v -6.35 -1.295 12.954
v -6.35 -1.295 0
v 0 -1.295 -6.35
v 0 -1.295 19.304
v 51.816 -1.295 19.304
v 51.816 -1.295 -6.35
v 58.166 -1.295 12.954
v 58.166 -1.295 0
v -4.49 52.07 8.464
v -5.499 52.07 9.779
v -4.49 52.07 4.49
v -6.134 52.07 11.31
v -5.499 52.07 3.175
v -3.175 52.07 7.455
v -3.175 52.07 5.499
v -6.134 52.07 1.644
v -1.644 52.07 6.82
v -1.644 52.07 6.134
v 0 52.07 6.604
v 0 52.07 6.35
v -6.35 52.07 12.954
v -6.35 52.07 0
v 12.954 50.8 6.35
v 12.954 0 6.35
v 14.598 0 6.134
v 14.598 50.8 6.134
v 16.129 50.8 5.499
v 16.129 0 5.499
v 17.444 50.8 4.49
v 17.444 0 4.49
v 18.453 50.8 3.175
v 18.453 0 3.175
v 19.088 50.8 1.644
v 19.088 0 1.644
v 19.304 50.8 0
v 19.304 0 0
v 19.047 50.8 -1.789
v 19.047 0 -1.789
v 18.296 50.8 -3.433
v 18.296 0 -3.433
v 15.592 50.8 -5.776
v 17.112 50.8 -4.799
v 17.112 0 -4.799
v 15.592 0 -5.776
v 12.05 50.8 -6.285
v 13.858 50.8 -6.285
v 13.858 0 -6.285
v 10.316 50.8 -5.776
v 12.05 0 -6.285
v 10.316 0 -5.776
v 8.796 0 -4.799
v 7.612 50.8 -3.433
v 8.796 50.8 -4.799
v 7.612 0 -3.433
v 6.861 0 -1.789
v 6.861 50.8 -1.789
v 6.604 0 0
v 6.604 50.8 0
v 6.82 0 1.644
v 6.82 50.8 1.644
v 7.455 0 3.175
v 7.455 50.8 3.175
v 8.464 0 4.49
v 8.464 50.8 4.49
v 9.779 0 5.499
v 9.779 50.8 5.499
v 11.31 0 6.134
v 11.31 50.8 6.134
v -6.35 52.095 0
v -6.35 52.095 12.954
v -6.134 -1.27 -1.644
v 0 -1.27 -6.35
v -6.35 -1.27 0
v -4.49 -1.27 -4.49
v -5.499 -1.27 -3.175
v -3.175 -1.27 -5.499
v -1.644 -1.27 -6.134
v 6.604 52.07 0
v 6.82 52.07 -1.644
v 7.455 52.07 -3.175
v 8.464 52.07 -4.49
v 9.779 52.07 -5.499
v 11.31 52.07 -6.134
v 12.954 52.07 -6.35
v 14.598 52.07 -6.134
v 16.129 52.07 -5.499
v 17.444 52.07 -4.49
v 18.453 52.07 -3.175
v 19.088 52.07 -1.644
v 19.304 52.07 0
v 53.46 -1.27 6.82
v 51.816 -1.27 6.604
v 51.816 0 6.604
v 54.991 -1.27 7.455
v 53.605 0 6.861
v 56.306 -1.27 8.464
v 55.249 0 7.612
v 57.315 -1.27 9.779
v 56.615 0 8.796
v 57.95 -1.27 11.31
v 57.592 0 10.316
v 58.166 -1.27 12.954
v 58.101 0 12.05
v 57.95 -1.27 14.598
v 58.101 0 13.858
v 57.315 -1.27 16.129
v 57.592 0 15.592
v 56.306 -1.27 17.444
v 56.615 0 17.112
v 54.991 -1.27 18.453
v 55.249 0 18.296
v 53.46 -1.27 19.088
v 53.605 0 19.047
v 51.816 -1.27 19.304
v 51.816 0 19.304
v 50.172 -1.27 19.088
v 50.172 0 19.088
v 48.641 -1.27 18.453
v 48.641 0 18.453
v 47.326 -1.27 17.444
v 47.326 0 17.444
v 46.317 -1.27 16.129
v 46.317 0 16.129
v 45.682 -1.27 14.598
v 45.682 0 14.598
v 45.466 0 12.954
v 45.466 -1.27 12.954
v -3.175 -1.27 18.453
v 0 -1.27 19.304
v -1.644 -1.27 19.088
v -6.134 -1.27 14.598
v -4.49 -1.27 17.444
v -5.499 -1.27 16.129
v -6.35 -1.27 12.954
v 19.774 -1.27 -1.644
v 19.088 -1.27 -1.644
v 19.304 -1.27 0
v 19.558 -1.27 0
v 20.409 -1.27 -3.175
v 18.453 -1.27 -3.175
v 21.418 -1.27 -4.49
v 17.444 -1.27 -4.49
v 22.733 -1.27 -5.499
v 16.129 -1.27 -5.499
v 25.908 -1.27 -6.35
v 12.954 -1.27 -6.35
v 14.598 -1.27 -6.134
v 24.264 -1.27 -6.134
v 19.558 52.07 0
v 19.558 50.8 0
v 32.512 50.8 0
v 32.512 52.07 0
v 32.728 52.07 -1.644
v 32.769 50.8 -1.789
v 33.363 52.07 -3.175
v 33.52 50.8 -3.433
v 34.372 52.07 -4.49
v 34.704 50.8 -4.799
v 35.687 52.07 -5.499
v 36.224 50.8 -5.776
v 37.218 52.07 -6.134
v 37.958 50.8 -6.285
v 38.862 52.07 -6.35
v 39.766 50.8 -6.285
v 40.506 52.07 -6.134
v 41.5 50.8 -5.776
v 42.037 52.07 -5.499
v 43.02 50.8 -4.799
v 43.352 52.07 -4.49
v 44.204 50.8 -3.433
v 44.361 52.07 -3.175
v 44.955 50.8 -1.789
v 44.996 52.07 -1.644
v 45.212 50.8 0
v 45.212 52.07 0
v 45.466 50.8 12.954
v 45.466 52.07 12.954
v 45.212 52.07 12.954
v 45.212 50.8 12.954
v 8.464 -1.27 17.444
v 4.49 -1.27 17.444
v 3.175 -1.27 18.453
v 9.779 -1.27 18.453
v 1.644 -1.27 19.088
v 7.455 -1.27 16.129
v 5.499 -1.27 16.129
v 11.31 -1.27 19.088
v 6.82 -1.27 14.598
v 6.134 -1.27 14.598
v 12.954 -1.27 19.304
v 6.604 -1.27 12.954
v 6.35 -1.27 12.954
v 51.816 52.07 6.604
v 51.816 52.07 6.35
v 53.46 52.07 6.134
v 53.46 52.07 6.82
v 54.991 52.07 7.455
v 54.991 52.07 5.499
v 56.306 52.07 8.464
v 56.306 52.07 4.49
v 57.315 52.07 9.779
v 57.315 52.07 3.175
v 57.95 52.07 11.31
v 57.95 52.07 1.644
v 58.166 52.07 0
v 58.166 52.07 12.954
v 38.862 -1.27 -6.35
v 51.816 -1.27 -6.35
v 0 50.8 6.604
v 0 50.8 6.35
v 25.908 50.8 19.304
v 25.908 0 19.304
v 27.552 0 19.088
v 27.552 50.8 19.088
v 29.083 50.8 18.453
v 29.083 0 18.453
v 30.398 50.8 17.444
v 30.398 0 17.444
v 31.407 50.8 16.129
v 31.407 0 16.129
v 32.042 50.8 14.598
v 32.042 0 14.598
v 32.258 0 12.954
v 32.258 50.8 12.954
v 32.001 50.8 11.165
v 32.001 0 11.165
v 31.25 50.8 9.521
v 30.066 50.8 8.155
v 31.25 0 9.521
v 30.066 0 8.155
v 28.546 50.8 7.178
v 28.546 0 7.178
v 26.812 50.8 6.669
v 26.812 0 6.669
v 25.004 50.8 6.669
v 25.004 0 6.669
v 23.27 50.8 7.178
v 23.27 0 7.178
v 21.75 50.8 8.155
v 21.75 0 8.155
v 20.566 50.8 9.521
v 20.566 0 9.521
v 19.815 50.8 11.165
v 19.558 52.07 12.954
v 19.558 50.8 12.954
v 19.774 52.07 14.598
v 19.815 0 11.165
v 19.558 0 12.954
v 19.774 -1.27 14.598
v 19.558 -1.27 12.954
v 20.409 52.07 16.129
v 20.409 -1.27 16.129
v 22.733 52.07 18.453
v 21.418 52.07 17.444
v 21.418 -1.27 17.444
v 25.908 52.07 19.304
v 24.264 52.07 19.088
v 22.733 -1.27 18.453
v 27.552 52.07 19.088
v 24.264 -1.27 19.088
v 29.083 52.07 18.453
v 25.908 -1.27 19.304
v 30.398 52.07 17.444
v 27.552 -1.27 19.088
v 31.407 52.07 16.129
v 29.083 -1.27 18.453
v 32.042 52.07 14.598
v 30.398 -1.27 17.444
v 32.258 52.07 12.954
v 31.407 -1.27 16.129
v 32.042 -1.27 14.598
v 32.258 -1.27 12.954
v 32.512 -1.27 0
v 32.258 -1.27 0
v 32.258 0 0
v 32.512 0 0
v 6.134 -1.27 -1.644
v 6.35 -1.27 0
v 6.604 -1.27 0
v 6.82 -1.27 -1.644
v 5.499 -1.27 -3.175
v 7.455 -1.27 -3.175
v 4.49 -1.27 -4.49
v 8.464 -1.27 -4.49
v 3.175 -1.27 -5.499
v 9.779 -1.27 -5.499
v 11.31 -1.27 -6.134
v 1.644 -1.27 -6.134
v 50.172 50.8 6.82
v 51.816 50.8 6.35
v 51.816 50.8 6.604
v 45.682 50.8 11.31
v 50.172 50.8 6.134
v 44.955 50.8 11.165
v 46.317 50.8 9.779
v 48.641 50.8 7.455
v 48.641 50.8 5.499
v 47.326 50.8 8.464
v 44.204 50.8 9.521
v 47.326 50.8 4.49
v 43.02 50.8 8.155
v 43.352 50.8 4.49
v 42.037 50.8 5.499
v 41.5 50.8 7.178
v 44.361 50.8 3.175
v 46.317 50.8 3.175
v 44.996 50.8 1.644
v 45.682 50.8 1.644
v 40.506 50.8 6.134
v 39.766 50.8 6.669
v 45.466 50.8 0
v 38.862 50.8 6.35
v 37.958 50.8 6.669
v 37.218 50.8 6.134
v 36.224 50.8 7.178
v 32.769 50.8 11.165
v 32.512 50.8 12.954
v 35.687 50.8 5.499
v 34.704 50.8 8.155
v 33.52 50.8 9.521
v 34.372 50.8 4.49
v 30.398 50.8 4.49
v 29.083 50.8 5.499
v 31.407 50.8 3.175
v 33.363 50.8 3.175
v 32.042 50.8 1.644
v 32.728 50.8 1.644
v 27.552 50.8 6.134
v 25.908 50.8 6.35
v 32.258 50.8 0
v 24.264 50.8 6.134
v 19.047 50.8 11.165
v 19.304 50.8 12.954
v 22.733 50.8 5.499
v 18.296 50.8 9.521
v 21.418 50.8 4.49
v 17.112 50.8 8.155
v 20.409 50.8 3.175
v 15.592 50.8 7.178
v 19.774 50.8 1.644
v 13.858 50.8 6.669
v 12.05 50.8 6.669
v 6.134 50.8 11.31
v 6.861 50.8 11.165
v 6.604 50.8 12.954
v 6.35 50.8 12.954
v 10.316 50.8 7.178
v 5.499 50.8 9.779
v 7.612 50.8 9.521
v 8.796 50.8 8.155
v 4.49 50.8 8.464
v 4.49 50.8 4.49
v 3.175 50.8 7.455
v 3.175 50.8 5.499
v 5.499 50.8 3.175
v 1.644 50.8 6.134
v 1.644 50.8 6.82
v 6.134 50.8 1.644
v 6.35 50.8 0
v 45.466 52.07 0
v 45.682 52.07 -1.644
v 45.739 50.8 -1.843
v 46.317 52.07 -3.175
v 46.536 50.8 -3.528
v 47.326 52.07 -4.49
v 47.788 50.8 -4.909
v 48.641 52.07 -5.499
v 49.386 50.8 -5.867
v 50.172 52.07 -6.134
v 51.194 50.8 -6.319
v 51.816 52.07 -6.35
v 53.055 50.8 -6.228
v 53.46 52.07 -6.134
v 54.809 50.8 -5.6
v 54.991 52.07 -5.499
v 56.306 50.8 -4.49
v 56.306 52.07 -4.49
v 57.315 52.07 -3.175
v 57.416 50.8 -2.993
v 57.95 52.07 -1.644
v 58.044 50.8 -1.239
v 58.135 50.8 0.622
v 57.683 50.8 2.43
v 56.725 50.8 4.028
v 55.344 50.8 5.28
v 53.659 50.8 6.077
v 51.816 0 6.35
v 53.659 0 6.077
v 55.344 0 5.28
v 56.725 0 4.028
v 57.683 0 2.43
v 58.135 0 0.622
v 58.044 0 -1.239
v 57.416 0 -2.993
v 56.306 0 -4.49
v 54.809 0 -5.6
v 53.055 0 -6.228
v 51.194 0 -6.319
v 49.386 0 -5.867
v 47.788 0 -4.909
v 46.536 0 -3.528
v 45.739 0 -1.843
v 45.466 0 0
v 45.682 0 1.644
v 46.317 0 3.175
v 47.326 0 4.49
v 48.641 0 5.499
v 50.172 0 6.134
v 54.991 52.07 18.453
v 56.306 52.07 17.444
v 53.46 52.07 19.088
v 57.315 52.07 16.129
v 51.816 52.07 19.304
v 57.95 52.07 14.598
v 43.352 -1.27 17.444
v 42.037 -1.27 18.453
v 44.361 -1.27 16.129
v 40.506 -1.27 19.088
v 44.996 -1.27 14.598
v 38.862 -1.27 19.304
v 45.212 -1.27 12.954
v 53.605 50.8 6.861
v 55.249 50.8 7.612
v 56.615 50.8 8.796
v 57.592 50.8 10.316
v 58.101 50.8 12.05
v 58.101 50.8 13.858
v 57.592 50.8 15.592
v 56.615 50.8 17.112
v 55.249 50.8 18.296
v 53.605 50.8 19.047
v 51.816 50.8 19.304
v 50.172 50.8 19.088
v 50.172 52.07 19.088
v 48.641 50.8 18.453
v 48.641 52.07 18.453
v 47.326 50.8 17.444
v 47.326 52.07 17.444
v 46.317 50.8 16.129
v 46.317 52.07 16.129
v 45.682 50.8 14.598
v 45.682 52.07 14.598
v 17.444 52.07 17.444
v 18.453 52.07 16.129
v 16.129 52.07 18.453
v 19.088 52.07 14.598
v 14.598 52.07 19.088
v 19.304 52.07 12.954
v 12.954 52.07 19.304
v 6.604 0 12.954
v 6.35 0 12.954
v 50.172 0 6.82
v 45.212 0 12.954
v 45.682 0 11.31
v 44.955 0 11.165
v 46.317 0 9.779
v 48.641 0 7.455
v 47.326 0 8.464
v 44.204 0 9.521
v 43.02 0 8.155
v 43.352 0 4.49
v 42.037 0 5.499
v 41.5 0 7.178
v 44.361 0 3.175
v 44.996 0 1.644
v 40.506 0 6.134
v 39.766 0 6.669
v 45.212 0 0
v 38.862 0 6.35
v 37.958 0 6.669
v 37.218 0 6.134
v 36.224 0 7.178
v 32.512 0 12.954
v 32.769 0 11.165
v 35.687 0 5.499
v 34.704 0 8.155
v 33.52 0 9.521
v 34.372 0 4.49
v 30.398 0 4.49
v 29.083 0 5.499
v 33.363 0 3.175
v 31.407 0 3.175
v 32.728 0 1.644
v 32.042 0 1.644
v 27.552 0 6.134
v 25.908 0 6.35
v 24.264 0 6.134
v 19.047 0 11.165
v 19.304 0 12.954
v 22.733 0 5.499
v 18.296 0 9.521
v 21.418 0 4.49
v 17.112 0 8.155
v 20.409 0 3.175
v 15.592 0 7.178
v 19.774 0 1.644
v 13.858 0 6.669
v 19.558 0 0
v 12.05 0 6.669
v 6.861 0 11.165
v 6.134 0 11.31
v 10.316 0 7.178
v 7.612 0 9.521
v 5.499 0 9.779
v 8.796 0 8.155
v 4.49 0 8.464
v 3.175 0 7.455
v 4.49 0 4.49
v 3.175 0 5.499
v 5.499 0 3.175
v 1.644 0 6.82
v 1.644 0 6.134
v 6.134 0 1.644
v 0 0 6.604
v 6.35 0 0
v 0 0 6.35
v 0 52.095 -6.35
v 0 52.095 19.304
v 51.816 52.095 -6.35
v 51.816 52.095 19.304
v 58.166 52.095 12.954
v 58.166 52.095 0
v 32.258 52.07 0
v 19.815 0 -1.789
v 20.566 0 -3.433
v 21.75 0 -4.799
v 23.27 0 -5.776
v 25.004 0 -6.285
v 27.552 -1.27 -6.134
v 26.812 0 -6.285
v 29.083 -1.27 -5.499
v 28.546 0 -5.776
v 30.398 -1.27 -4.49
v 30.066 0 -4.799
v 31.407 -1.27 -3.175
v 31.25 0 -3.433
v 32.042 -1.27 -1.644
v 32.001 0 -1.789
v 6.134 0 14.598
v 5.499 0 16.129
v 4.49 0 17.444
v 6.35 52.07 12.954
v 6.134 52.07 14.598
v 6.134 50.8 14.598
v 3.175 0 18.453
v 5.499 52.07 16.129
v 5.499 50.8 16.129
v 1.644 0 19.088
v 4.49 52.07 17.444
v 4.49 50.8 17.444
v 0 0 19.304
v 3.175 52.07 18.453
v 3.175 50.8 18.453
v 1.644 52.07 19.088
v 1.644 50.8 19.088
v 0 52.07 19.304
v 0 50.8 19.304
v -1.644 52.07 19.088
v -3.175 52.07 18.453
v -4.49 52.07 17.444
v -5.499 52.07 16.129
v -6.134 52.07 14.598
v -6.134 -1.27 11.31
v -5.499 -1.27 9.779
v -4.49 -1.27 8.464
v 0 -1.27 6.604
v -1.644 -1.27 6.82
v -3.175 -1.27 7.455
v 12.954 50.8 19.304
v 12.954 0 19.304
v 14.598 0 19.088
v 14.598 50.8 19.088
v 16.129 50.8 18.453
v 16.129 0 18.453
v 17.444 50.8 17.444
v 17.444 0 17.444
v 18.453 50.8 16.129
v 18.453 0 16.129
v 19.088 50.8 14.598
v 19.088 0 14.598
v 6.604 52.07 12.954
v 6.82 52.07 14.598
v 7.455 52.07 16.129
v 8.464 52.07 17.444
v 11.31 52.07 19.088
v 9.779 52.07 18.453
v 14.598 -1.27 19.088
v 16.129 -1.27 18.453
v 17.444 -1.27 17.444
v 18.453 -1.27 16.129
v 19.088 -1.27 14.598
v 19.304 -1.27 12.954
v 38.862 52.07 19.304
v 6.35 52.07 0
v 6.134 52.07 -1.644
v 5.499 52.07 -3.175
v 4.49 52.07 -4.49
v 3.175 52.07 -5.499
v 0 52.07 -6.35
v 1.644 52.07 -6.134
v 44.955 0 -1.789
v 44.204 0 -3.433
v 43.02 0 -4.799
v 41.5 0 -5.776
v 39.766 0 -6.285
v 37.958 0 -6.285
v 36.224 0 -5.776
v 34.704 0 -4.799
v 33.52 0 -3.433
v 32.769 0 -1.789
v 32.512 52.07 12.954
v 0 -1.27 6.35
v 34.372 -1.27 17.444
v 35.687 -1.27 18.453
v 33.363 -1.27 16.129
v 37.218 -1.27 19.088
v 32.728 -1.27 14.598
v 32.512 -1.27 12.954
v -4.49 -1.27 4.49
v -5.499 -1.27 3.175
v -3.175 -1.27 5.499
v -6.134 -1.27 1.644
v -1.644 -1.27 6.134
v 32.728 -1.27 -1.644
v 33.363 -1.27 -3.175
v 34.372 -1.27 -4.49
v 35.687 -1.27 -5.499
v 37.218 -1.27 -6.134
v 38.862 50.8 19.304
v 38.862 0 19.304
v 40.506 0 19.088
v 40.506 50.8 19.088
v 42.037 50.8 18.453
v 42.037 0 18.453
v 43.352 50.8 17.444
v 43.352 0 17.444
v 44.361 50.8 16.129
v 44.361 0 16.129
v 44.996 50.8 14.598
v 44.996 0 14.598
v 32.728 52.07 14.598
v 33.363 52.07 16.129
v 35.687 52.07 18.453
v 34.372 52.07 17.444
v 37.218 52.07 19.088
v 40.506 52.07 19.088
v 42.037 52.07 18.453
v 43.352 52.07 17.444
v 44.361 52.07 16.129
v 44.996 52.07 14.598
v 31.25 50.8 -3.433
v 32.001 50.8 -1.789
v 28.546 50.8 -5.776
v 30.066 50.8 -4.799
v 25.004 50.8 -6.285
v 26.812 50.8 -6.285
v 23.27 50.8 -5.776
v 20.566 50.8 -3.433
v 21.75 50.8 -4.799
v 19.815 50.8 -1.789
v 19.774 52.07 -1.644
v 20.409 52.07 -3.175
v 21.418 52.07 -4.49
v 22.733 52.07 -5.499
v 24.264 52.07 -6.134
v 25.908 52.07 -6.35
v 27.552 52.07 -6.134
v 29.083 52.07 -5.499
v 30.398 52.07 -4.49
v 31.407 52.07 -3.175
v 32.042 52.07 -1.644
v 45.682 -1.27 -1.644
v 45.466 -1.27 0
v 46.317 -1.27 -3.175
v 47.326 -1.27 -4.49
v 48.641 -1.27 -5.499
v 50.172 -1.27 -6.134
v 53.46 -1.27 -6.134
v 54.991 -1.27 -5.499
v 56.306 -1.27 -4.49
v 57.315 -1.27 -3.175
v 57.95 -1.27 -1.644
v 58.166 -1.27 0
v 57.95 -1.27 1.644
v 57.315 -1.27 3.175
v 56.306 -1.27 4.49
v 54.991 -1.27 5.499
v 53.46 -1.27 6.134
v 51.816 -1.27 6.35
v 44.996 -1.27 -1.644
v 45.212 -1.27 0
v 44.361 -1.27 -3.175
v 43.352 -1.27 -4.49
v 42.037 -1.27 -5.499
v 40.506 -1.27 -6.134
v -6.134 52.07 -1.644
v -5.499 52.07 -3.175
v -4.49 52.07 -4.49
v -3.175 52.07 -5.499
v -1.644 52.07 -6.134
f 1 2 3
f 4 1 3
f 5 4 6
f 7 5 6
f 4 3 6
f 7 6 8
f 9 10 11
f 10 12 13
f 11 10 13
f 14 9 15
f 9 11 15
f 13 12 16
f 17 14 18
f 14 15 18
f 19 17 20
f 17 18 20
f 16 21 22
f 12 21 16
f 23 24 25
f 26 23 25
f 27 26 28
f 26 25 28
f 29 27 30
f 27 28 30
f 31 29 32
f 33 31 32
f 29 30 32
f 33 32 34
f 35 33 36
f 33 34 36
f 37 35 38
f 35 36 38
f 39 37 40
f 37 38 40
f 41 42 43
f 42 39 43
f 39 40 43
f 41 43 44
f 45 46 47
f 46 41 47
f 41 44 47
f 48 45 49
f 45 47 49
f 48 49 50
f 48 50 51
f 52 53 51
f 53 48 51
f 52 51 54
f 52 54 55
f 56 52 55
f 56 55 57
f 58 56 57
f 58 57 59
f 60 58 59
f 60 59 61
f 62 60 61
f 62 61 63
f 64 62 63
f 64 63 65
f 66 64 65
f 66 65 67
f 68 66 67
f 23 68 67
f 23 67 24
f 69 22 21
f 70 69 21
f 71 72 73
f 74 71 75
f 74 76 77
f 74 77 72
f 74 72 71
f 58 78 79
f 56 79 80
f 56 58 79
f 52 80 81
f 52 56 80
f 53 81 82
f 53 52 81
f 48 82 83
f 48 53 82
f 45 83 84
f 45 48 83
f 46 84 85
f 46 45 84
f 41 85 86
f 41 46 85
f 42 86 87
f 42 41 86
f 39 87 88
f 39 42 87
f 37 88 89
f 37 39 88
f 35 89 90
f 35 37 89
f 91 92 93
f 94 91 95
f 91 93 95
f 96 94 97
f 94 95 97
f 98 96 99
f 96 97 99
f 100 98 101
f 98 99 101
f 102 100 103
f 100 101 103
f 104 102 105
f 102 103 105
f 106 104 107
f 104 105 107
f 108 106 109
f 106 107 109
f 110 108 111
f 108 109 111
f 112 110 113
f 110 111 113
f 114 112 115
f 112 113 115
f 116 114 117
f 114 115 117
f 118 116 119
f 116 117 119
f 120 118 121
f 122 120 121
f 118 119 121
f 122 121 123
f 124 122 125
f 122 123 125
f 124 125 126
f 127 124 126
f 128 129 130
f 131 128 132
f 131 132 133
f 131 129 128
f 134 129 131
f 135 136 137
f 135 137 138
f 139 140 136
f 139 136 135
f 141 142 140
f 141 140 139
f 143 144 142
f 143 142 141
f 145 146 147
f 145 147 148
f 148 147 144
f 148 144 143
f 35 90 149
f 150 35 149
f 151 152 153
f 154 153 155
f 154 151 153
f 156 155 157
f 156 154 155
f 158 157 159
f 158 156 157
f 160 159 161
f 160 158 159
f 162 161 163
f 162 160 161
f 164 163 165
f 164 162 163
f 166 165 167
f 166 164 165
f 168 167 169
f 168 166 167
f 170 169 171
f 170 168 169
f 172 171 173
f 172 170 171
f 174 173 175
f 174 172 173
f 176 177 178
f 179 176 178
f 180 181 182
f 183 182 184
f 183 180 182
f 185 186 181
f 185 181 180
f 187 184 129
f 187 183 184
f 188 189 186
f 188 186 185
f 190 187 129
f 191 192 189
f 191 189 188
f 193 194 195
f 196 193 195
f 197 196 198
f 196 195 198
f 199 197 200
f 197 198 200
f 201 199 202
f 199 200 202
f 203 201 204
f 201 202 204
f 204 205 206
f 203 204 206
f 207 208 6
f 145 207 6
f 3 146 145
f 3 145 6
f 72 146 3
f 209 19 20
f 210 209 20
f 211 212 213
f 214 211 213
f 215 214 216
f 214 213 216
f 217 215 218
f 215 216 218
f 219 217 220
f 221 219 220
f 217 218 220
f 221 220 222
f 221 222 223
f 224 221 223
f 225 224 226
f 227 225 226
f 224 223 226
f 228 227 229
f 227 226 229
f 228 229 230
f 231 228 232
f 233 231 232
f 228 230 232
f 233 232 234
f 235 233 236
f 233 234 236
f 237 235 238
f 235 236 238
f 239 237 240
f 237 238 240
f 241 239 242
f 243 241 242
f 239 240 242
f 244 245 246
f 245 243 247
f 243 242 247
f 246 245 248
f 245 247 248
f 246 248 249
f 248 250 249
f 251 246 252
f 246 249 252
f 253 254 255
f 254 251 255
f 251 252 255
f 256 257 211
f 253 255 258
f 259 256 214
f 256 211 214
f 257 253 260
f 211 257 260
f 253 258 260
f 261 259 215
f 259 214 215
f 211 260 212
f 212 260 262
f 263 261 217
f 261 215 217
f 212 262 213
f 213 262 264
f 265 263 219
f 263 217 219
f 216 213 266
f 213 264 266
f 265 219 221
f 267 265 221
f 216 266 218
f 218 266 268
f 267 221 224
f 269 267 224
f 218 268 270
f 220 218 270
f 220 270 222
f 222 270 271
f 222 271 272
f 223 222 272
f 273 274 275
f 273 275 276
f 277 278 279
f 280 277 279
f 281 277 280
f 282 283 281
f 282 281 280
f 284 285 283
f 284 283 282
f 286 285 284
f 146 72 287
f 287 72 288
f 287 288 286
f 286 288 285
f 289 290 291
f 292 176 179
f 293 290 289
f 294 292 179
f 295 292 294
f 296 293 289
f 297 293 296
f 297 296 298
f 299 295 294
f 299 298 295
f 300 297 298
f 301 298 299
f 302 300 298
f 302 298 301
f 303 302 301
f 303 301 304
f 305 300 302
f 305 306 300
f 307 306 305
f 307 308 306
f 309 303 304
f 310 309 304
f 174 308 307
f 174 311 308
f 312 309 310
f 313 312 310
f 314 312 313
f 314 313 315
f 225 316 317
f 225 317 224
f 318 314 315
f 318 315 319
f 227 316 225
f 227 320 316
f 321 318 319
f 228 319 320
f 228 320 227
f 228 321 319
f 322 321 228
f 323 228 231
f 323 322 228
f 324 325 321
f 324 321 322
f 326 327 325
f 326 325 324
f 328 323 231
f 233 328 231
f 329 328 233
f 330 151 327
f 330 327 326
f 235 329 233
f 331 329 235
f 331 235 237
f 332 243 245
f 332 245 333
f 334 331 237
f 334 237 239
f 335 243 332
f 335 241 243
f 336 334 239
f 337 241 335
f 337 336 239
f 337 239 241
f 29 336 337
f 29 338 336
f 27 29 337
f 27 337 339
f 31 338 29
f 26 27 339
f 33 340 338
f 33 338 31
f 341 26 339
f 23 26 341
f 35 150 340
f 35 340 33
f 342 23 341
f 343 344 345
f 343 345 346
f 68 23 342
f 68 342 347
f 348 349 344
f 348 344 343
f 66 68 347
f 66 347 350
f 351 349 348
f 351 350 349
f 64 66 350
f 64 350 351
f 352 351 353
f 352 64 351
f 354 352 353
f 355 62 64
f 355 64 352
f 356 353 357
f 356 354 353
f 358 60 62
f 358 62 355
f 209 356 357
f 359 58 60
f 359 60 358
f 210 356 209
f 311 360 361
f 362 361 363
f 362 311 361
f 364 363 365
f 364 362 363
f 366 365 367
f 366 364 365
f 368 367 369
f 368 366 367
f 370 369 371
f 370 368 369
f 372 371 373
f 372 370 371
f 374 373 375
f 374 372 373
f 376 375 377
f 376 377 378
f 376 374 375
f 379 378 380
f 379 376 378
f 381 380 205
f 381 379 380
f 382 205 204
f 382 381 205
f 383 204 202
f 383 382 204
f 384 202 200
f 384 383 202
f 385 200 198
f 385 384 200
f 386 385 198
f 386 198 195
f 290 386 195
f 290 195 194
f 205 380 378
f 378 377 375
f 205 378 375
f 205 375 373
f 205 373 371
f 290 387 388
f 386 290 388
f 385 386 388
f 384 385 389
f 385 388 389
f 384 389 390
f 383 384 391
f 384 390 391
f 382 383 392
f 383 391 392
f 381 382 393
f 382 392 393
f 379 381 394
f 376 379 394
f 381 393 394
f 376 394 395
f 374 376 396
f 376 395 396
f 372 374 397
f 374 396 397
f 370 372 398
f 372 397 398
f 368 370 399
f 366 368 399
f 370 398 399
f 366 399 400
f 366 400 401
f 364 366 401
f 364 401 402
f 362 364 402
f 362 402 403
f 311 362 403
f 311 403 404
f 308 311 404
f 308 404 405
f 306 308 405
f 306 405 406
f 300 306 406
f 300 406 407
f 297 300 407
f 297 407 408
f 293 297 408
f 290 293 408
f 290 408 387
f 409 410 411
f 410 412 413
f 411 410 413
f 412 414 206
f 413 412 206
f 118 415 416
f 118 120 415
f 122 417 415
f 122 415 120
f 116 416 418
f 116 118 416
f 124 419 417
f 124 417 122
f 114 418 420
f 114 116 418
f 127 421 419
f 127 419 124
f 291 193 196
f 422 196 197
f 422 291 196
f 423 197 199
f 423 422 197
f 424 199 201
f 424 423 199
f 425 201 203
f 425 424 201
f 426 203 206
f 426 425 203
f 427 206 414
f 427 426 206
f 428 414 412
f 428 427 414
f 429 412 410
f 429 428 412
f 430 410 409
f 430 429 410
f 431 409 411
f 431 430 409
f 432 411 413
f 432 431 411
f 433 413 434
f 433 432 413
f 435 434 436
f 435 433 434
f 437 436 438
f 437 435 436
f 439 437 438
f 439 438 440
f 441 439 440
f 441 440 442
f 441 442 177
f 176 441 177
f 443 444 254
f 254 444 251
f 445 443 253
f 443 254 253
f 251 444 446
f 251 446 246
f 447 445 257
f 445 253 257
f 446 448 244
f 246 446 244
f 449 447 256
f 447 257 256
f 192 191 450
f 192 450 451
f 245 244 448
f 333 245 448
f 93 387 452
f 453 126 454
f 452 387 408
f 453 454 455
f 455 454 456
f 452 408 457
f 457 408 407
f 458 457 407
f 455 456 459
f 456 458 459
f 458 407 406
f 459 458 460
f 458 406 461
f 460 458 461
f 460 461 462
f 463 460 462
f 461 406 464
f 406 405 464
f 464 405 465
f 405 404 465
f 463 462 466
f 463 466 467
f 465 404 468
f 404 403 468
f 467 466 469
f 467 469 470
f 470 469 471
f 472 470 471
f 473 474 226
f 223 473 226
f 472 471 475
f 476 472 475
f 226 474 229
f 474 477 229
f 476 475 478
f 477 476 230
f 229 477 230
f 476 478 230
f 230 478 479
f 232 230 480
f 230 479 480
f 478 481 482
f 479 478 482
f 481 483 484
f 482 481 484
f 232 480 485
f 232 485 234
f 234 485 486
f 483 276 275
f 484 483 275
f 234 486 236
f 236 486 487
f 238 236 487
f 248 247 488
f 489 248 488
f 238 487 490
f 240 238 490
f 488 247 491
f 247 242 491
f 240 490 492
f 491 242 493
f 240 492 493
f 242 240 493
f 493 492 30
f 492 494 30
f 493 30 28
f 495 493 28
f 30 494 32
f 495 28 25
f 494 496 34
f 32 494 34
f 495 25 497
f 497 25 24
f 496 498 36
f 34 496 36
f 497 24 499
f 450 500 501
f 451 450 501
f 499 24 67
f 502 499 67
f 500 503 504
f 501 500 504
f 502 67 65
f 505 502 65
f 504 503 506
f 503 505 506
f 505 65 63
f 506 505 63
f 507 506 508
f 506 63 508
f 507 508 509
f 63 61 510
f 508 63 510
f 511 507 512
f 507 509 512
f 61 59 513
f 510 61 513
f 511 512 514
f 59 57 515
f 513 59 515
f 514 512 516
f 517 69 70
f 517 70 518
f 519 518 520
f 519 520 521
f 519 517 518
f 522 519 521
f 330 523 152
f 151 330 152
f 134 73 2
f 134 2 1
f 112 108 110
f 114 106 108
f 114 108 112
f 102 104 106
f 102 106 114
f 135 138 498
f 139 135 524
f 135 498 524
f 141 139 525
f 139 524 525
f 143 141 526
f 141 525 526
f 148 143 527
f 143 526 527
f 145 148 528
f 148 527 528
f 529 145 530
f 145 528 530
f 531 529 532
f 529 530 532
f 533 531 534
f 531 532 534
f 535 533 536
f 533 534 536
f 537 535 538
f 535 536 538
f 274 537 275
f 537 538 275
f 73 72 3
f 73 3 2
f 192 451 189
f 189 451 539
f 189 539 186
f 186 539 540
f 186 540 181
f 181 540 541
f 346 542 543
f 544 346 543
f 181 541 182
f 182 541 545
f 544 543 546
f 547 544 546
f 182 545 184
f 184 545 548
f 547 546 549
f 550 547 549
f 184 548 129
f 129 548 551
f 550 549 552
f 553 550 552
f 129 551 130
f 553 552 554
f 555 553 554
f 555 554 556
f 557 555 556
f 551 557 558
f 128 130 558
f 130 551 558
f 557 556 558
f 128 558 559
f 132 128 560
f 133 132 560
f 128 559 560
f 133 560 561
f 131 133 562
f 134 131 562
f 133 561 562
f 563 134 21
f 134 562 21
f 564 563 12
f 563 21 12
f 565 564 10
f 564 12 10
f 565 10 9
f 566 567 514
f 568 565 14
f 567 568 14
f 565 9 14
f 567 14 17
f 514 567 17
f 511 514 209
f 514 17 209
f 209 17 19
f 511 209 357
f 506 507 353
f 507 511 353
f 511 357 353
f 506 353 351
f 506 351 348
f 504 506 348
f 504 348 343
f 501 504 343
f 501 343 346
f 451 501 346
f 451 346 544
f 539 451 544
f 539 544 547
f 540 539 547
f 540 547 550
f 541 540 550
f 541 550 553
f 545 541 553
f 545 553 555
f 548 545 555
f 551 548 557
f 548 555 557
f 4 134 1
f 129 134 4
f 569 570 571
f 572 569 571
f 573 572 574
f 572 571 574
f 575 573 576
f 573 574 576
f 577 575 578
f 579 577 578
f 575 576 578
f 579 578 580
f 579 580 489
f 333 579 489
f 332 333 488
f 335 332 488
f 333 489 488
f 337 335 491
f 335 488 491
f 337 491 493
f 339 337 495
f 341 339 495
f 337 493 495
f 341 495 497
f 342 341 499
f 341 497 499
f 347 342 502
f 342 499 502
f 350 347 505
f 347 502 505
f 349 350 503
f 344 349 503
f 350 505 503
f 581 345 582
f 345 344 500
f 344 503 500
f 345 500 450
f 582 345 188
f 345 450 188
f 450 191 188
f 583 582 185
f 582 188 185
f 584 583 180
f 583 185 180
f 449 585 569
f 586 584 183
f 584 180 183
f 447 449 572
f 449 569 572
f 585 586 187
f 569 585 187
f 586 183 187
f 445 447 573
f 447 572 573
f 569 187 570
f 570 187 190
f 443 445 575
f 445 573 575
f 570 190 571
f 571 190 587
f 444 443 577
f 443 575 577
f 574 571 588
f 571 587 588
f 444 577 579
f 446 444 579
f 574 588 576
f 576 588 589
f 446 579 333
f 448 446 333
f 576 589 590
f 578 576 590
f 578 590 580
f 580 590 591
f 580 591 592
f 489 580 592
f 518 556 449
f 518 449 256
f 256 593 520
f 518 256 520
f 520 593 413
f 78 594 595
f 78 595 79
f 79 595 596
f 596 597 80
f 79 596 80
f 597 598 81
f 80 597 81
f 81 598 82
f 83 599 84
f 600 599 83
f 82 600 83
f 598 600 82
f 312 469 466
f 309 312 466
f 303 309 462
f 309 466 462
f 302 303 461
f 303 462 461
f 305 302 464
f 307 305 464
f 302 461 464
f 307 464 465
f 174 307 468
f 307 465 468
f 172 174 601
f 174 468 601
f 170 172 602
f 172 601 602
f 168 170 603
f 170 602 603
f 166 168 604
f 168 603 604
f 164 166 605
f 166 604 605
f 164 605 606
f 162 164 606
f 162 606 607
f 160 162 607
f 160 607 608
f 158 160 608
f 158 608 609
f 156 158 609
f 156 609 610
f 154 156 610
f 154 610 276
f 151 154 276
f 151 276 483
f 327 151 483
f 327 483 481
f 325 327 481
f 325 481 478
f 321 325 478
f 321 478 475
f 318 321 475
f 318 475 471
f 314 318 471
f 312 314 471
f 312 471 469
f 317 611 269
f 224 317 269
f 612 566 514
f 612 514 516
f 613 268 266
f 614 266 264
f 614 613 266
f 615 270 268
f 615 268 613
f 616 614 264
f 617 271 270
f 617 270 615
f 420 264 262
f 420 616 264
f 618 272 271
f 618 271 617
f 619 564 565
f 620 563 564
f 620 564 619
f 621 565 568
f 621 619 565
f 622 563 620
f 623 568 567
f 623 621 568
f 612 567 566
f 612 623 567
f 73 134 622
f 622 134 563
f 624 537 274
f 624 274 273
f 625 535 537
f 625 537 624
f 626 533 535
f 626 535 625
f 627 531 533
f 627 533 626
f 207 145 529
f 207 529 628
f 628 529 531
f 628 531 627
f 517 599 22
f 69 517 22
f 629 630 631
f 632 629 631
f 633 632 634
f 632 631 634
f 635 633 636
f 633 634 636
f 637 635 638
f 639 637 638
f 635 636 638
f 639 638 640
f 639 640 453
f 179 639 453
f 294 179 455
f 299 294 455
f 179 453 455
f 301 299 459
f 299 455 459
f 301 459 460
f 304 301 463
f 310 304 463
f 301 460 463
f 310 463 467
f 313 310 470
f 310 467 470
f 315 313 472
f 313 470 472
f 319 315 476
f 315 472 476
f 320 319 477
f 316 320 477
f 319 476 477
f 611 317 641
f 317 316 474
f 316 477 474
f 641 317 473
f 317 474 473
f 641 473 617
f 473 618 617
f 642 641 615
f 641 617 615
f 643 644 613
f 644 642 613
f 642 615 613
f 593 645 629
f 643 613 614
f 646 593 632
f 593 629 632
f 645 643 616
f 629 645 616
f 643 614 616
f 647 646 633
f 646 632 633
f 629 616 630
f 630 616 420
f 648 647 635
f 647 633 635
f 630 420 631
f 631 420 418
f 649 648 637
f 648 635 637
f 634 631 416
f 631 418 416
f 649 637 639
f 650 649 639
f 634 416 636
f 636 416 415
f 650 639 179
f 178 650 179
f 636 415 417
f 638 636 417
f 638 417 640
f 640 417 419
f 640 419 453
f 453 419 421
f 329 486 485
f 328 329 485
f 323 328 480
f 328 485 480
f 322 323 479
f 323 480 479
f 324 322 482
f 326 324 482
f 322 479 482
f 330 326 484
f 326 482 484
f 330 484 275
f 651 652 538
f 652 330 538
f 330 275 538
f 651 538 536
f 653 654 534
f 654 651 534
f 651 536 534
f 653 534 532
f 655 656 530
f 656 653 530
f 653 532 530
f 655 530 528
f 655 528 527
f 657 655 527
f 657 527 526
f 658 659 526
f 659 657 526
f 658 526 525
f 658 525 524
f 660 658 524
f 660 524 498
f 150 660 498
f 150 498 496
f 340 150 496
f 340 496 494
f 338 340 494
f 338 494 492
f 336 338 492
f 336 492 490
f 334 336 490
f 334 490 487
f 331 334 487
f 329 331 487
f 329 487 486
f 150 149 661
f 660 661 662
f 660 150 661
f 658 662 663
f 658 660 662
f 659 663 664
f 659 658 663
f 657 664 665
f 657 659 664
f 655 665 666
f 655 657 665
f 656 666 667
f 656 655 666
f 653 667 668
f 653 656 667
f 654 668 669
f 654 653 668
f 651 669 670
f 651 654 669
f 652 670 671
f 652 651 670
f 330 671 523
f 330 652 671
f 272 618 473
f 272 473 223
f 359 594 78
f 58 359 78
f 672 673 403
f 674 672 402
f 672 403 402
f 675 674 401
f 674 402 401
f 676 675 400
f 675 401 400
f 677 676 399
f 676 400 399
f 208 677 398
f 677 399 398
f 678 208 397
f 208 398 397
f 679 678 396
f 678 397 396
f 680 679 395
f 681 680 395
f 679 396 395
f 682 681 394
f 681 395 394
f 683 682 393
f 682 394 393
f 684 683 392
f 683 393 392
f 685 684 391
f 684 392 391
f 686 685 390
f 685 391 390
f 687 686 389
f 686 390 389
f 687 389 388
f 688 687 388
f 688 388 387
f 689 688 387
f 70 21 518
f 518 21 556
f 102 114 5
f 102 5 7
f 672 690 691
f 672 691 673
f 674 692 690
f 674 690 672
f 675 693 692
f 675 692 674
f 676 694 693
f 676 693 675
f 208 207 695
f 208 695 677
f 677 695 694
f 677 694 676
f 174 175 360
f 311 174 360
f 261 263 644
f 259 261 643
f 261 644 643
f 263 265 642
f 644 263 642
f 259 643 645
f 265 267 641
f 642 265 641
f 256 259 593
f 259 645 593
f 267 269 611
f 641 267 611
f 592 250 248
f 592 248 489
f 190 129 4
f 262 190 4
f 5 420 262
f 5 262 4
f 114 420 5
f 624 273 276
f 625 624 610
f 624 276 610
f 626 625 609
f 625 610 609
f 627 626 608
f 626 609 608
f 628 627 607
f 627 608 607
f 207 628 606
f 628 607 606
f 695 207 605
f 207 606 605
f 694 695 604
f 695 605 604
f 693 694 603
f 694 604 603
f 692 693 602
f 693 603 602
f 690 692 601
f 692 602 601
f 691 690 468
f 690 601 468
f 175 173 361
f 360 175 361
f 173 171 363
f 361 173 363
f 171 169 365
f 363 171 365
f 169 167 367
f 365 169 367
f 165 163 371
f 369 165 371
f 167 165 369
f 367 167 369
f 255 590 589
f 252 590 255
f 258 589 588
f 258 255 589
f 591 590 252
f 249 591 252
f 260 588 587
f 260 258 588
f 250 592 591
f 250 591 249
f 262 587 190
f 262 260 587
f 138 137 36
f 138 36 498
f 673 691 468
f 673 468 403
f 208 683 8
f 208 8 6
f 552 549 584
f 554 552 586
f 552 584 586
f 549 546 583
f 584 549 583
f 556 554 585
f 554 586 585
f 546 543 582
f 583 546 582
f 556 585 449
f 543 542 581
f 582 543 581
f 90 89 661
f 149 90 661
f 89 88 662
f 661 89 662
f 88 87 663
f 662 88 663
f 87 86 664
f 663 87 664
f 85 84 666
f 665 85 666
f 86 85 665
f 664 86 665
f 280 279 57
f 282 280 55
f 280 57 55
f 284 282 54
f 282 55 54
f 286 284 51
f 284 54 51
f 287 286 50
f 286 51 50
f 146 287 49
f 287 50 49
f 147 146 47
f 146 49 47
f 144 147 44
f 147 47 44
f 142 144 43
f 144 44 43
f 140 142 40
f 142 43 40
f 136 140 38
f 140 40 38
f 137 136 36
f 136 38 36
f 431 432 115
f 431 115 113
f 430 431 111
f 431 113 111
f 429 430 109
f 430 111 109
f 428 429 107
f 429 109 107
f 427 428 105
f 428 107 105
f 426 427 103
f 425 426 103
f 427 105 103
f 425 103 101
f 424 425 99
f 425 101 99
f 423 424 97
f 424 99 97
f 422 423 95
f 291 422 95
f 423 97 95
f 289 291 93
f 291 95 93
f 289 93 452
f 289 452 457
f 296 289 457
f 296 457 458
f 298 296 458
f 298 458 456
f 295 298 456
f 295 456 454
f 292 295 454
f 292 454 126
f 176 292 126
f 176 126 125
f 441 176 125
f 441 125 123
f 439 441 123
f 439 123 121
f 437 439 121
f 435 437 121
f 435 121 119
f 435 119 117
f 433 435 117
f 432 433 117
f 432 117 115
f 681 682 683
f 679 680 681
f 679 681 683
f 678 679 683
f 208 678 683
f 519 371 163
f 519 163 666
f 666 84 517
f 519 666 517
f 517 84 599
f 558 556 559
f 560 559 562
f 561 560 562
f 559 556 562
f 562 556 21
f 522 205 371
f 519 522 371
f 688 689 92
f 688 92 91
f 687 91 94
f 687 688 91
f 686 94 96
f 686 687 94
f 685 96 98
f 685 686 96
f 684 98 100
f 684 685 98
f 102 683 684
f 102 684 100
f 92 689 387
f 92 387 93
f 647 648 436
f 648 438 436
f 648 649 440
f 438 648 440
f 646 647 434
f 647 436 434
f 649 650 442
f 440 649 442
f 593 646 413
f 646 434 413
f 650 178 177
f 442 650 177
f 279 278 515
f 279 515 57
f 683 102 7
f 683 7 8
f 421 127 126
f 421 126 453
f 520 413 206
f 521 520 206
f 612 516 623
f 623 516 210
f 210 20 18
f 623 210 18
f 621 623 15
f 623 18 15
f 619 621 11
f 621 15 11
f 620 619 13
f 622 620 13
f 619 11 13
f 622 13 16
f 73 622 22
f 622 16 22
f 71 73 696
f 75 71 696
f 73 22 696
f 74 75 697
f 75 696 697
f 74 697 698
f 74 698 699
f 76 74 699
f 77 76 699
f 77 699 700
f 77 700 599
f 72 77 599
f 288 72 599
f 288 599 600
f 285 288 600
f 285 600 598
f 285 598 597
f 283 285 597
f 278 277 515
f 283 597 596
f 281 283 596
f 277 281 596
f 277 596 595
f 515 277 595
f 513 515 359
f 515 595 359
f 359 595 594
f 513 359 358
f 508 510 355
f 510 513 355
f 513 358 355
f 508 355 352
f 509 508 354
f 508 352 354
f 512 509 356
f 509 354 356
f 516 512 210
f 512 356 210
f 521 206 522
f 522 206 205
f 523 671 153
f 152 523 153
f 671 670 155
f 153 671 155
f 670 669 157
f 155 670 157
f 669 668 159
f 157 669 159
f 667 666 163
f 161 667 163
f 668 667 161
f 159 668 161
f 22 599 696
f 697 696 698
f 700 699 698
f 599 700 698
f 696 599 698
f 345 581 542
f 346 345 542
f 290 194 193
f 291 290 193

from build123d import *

# Parameters (mm, degrees)
SKETCH1_R              = 6.35
BOSS_EXTRUDE1_DEPTH    = 50.8
SKETCH1_R_2            = 6.349999999999999
BOSS_EXTRUDE1_2_DEPTH  = 50.8
SKETCH1_R_3            = 6.350000000000002
BOSS_EXTRUDE1_3_DEPTH  = 50.8
BOSS_EXTRUDE1_4_DEPTH  = 50.8
BOSS_EXTRUDE1_5_DEPTH  = 50.8
BOSS_EXTRUDE1_6_DEPTH  = 50.8
BOSS_EXTRUDE1_7_DEPTH  = 50.8
SKETCH1_R_4            = 6.350000000000003
BOSS_EXTRUDE1_8_DEPTH  = 50.8
BOSS_EXTRUDE1_9_DEPTH  = 50.8
SKETCH1_R_5            = 6.3500000000000005
BOSS_EXTRUDE1_10_DEPTH = 50.8
BOSS_EXTRUDE2_DEPTH    = 1.27
BOSS_EXTRUDE3_DEPTH    = 0.0254


with BuildPart() as part:
    # Sketch1 → Boss-Extrude1 (new body)
    with BuildSketch(Plane(origin=(0, 0, 0), x_dir=(1, 0, 0), z_dir=(0, 1, 0))):
        with Locations(Location((0, 0, 0), (0, 0, 270))):
            Circle(SKETCH1_R)
    extrude(amount=BOSS_EXTRUDE1_DEPTH)



with BuildPart() as body_2:
    # Sketch1 → Boss-Extrude1 2 (new body)
    with BuildSketch(Plane(origin=(0, 0, 0), x_dir=(1, 0, 0), z_dir=(0, 1, 0))):
        with Locations(Location((12.954, 0, 0), (0, 0, 270))):
            Circle(SKETCH1_R_2)
    extrude(amount=BOSS_EXTRUDE1_2_DEPTH)


with BuildPart() as body_3:
    # Sketch1 → Boss-Extrude1 3 (new body)
    with BuildSketch(Plane(origin=(0, 0, 0), x_dir=(1, 0, 0), z_dir=(0, 1, 0))):
        with Locations(Location((25.908, 0, 0), (0, 0, 270))):
            Circle(SKETCH1_R_3)
    extrude(amount=BOSS_EXTRUDE1_3_DEPTH)


with BuildPart() as body_4:
    # Sketch1 → Boss-Extrude1 4 (new body)
    with BuildSketch(Plane(origin=(0, 0, 0), x_dir=(1, 0, 0), z_dir=(0, 1, 0))):
        with Locations(Location((38.862, 0, 0), (0, 0, 270))):
            Circle(SKETCH1_R_3)
    extrude(amount=BOSS_EXTRUDE1_4_DEPTH)


with BuildPart() as body_5:
    # Sketch1 → Boss-Extrude1 5 (new body)
    with BuildSketch(Plane(origin=(0, 0, 0), x_dir=(1, 0, 0), z_dir=(0, 1, 0))):
        with Locations(Location((51.816, 0, 0), (0, 0, 270))):
            Circle(SKETCH1_R_3)
    extrude(amount=BOSS_EXTRUDE1_5_DEPTH)


with BuildPart() as body_6:
    # Sketch1 → Boss-Extrude1 6 (new body)
    with BuildSketch(Plane(origin=(0, 0, 0), x_dir=(1, 0, 0), z_dir=(0, 1, 0))):
        with Locations(Location((12.954000000000136, -12.954, 0), (0, 0, 270))):
            Circle(SKETCH1_R)
    extrude(amount=BOSS_EXTRUDE1_6_DEPTH)


with BuildPart() as body_7:
    # Sketch1 → Boss-Extrude1 7 (new body)
    with BuildSketch(Plane(origin=(0, 0, 0), x_dir=(1, 0, 0), z_dir=(0, 1, 0))):
        with Locations(Location((25.908000000000136, -12.954, 0), (0, 0, 270))):
            Circle(SKETCH1_R)
    extrude(amount=BOSS_EXTRUDE1_7_DEPTH)


with BuildPart() as body_8:
    # Sketch1 → Boss-Extrude1 8 (new body)
    with BuildSketch(Plane(origin=(0, 0, 0), x_dir=(1, 0, 0), z_dir=(0, 1, 0))):
        with Locations(Location((38.86200000000014, -12.954, 0), (0, 0, 270))):
            Circle(SKETCH1_R_4)
    extrude(amount=BOSS_EXTRUDE1_8_DEPTH)


with BuildPart() as body_9:
    # Sketch1 → Boss-Extrude1 9 (new body)
    with BuildSketch(Plane(origin=(0, 0, 0), x_dir=(1, 0, 0), z_dir=(0, 1, 0))):
        with Locations(Location((51.81600000000014, -12.954, 0), (0, 0, 270))):
            Circle(SKETCH1_R_4)
    extrude(amount=BOSS_EXTRUDE1_9_DEPTH)


with BuildPart() as body_10:
    # Sketch1 → Boss-Extrude1 10 (new body)
    with BuildSketch(Plane(origin=(0, 0, 0), x_dir=(1, 0, 0), z_dir=(0, 1, 0))):
        with Locations(Location((1.3569e-13, -12.954, 0), (0, 0, 270))):
            Circle(SKETCH1_R_5)
    extrude(amount=BOSS_EXTRUDE1_10_DEPTH)


with BuildPart() as part_1:
    add(part.part)

    add(body_2.part)  # Boss-Extrude2 merges body 2

    add(body_3.part)  # Boss-Extrude2 merges body 3

    add(body_4.part)  # Boss-Extrude2 merges body 4

    add(body_5.part)  # Boss-Extrude2 merges body 5

    add(body_6.part)  # Boss-Extrude2 merges body 6

    add(body_7.part)  # Boss-Extrude2 merges body 7

    add(body_8.part)  # Boss-Extrude2 merges body 8

    add(body_9.part)  # Boss-Extrude2 merges body 9

    add(body_10.part)  # Boss-Extrude2 merges body 10
    # Sketch4 → Boss-Extrude2 (add)
    with BuildSketch(Plane(origin=(0, 50.8, 0), x_dir=(1, 0, 0), z_dir=(0, 1, 0))):
        with BuildLine():
            Line((1.3569e-13, -6.604), (0, -6.35))
            ThreePointArc((0, -6.35), (-4.490128060534576, 4.490128060534577), (6.35, 0))
            Line((6.35, 0), (6.603999999999998, 0))
            ThreePointArc((6.603999999999998, 0), (12.954, 6.350000000000001), (19.304000000000002, 0))
            Line((19.304000000000002, 0), (19.558, 0))
            ThreePointArc((19.558, 0), (25.908, 6.350000000000001), (32.258, 0))
            Line((32.258, 0), (32.512, 0))
            ThreePointArc((32.512, 0), (38.862, 6.350000000000001), (45.212, 0))
            Line((45.212, 0), (45.466, 0))
            ThreePointArc((45.466, 0), (56.30612806053458, 4.490128060534578), (51.816, -6.350000000000002))
            Line((51.816, -6.350000000000002), (51.81600000000014, -6.603999999999998))
            ThreePointArc((51.81600000000014, -6.603999999999998), (56.30612806053472, -17.44412806053458), (45.466000000000136, -12.954))
            Line((45.466000000000136, -12.954), (45.21200000000014, -12.954))
            ThreePointArc((45.21200000000014, -12.954), (38.86200000000014, -19.304000000000002), (32.512000000000135, -12.954))
            Line((32.512000000000135, -12.954), (32.25800000000013, -12.954))
            ThreePointArc((32.25800000000013, -12.954), (25.908000000000136, -19.304), (19.55800000000014, -12.954))
            Line((19.55800000000014, -12.954), (19.304000000000133, -12.954))
            ThreePointArc((19.304000000000133, -12.954), (12.954000000000134, -19.304), (6.604000000000137, -12.954))
            Line((6.604000000000137, -12.954), (6.350000000000135, -12.954))
            ThreePointArc((6.350000000000135, -12.954), (-4.490128060534443, -17.444128060534577), (1.3569e-13, -6.604))
        make_face()
    boss_extrude2 = extrude(amount=BOSS_EXTRUDE2_DEPTH)

    # Mirror1: Boss-Extrude2 across plane
    add(boss_extrude2.mirror(Plane.ZX.offset(25.4)))

    # Sketch5 → Boss-Extrude3 (add)
    with BuildSketch(Plane(origin=(0, 52.07, 0), x_dir=(1, 0, 0), z_dir=(0, 1, 0))):
        Polygon((51.81599999999998, 6.350000000000001), (-2.602e-14, 6.349999999999999), (-6.35, -4.434e-14), (-6.349999999999865, -12.954000000000045), (2.5457e-13, -19.304000000000002), (51.81600000000021, -19.304000000000002), (58.16600000000014, -12.95399999999983), (58.166000000000004, 0), align=None)
    boss_extrude3 = extrude(amount=BOSS_EXTRUDE3_DEPTH)

    # Mirror2: Boss-Extrude3 across plane
    add(boss_extrude3.mirror(Plane.ZX.offset(25.4)))


solid = part_1.part
